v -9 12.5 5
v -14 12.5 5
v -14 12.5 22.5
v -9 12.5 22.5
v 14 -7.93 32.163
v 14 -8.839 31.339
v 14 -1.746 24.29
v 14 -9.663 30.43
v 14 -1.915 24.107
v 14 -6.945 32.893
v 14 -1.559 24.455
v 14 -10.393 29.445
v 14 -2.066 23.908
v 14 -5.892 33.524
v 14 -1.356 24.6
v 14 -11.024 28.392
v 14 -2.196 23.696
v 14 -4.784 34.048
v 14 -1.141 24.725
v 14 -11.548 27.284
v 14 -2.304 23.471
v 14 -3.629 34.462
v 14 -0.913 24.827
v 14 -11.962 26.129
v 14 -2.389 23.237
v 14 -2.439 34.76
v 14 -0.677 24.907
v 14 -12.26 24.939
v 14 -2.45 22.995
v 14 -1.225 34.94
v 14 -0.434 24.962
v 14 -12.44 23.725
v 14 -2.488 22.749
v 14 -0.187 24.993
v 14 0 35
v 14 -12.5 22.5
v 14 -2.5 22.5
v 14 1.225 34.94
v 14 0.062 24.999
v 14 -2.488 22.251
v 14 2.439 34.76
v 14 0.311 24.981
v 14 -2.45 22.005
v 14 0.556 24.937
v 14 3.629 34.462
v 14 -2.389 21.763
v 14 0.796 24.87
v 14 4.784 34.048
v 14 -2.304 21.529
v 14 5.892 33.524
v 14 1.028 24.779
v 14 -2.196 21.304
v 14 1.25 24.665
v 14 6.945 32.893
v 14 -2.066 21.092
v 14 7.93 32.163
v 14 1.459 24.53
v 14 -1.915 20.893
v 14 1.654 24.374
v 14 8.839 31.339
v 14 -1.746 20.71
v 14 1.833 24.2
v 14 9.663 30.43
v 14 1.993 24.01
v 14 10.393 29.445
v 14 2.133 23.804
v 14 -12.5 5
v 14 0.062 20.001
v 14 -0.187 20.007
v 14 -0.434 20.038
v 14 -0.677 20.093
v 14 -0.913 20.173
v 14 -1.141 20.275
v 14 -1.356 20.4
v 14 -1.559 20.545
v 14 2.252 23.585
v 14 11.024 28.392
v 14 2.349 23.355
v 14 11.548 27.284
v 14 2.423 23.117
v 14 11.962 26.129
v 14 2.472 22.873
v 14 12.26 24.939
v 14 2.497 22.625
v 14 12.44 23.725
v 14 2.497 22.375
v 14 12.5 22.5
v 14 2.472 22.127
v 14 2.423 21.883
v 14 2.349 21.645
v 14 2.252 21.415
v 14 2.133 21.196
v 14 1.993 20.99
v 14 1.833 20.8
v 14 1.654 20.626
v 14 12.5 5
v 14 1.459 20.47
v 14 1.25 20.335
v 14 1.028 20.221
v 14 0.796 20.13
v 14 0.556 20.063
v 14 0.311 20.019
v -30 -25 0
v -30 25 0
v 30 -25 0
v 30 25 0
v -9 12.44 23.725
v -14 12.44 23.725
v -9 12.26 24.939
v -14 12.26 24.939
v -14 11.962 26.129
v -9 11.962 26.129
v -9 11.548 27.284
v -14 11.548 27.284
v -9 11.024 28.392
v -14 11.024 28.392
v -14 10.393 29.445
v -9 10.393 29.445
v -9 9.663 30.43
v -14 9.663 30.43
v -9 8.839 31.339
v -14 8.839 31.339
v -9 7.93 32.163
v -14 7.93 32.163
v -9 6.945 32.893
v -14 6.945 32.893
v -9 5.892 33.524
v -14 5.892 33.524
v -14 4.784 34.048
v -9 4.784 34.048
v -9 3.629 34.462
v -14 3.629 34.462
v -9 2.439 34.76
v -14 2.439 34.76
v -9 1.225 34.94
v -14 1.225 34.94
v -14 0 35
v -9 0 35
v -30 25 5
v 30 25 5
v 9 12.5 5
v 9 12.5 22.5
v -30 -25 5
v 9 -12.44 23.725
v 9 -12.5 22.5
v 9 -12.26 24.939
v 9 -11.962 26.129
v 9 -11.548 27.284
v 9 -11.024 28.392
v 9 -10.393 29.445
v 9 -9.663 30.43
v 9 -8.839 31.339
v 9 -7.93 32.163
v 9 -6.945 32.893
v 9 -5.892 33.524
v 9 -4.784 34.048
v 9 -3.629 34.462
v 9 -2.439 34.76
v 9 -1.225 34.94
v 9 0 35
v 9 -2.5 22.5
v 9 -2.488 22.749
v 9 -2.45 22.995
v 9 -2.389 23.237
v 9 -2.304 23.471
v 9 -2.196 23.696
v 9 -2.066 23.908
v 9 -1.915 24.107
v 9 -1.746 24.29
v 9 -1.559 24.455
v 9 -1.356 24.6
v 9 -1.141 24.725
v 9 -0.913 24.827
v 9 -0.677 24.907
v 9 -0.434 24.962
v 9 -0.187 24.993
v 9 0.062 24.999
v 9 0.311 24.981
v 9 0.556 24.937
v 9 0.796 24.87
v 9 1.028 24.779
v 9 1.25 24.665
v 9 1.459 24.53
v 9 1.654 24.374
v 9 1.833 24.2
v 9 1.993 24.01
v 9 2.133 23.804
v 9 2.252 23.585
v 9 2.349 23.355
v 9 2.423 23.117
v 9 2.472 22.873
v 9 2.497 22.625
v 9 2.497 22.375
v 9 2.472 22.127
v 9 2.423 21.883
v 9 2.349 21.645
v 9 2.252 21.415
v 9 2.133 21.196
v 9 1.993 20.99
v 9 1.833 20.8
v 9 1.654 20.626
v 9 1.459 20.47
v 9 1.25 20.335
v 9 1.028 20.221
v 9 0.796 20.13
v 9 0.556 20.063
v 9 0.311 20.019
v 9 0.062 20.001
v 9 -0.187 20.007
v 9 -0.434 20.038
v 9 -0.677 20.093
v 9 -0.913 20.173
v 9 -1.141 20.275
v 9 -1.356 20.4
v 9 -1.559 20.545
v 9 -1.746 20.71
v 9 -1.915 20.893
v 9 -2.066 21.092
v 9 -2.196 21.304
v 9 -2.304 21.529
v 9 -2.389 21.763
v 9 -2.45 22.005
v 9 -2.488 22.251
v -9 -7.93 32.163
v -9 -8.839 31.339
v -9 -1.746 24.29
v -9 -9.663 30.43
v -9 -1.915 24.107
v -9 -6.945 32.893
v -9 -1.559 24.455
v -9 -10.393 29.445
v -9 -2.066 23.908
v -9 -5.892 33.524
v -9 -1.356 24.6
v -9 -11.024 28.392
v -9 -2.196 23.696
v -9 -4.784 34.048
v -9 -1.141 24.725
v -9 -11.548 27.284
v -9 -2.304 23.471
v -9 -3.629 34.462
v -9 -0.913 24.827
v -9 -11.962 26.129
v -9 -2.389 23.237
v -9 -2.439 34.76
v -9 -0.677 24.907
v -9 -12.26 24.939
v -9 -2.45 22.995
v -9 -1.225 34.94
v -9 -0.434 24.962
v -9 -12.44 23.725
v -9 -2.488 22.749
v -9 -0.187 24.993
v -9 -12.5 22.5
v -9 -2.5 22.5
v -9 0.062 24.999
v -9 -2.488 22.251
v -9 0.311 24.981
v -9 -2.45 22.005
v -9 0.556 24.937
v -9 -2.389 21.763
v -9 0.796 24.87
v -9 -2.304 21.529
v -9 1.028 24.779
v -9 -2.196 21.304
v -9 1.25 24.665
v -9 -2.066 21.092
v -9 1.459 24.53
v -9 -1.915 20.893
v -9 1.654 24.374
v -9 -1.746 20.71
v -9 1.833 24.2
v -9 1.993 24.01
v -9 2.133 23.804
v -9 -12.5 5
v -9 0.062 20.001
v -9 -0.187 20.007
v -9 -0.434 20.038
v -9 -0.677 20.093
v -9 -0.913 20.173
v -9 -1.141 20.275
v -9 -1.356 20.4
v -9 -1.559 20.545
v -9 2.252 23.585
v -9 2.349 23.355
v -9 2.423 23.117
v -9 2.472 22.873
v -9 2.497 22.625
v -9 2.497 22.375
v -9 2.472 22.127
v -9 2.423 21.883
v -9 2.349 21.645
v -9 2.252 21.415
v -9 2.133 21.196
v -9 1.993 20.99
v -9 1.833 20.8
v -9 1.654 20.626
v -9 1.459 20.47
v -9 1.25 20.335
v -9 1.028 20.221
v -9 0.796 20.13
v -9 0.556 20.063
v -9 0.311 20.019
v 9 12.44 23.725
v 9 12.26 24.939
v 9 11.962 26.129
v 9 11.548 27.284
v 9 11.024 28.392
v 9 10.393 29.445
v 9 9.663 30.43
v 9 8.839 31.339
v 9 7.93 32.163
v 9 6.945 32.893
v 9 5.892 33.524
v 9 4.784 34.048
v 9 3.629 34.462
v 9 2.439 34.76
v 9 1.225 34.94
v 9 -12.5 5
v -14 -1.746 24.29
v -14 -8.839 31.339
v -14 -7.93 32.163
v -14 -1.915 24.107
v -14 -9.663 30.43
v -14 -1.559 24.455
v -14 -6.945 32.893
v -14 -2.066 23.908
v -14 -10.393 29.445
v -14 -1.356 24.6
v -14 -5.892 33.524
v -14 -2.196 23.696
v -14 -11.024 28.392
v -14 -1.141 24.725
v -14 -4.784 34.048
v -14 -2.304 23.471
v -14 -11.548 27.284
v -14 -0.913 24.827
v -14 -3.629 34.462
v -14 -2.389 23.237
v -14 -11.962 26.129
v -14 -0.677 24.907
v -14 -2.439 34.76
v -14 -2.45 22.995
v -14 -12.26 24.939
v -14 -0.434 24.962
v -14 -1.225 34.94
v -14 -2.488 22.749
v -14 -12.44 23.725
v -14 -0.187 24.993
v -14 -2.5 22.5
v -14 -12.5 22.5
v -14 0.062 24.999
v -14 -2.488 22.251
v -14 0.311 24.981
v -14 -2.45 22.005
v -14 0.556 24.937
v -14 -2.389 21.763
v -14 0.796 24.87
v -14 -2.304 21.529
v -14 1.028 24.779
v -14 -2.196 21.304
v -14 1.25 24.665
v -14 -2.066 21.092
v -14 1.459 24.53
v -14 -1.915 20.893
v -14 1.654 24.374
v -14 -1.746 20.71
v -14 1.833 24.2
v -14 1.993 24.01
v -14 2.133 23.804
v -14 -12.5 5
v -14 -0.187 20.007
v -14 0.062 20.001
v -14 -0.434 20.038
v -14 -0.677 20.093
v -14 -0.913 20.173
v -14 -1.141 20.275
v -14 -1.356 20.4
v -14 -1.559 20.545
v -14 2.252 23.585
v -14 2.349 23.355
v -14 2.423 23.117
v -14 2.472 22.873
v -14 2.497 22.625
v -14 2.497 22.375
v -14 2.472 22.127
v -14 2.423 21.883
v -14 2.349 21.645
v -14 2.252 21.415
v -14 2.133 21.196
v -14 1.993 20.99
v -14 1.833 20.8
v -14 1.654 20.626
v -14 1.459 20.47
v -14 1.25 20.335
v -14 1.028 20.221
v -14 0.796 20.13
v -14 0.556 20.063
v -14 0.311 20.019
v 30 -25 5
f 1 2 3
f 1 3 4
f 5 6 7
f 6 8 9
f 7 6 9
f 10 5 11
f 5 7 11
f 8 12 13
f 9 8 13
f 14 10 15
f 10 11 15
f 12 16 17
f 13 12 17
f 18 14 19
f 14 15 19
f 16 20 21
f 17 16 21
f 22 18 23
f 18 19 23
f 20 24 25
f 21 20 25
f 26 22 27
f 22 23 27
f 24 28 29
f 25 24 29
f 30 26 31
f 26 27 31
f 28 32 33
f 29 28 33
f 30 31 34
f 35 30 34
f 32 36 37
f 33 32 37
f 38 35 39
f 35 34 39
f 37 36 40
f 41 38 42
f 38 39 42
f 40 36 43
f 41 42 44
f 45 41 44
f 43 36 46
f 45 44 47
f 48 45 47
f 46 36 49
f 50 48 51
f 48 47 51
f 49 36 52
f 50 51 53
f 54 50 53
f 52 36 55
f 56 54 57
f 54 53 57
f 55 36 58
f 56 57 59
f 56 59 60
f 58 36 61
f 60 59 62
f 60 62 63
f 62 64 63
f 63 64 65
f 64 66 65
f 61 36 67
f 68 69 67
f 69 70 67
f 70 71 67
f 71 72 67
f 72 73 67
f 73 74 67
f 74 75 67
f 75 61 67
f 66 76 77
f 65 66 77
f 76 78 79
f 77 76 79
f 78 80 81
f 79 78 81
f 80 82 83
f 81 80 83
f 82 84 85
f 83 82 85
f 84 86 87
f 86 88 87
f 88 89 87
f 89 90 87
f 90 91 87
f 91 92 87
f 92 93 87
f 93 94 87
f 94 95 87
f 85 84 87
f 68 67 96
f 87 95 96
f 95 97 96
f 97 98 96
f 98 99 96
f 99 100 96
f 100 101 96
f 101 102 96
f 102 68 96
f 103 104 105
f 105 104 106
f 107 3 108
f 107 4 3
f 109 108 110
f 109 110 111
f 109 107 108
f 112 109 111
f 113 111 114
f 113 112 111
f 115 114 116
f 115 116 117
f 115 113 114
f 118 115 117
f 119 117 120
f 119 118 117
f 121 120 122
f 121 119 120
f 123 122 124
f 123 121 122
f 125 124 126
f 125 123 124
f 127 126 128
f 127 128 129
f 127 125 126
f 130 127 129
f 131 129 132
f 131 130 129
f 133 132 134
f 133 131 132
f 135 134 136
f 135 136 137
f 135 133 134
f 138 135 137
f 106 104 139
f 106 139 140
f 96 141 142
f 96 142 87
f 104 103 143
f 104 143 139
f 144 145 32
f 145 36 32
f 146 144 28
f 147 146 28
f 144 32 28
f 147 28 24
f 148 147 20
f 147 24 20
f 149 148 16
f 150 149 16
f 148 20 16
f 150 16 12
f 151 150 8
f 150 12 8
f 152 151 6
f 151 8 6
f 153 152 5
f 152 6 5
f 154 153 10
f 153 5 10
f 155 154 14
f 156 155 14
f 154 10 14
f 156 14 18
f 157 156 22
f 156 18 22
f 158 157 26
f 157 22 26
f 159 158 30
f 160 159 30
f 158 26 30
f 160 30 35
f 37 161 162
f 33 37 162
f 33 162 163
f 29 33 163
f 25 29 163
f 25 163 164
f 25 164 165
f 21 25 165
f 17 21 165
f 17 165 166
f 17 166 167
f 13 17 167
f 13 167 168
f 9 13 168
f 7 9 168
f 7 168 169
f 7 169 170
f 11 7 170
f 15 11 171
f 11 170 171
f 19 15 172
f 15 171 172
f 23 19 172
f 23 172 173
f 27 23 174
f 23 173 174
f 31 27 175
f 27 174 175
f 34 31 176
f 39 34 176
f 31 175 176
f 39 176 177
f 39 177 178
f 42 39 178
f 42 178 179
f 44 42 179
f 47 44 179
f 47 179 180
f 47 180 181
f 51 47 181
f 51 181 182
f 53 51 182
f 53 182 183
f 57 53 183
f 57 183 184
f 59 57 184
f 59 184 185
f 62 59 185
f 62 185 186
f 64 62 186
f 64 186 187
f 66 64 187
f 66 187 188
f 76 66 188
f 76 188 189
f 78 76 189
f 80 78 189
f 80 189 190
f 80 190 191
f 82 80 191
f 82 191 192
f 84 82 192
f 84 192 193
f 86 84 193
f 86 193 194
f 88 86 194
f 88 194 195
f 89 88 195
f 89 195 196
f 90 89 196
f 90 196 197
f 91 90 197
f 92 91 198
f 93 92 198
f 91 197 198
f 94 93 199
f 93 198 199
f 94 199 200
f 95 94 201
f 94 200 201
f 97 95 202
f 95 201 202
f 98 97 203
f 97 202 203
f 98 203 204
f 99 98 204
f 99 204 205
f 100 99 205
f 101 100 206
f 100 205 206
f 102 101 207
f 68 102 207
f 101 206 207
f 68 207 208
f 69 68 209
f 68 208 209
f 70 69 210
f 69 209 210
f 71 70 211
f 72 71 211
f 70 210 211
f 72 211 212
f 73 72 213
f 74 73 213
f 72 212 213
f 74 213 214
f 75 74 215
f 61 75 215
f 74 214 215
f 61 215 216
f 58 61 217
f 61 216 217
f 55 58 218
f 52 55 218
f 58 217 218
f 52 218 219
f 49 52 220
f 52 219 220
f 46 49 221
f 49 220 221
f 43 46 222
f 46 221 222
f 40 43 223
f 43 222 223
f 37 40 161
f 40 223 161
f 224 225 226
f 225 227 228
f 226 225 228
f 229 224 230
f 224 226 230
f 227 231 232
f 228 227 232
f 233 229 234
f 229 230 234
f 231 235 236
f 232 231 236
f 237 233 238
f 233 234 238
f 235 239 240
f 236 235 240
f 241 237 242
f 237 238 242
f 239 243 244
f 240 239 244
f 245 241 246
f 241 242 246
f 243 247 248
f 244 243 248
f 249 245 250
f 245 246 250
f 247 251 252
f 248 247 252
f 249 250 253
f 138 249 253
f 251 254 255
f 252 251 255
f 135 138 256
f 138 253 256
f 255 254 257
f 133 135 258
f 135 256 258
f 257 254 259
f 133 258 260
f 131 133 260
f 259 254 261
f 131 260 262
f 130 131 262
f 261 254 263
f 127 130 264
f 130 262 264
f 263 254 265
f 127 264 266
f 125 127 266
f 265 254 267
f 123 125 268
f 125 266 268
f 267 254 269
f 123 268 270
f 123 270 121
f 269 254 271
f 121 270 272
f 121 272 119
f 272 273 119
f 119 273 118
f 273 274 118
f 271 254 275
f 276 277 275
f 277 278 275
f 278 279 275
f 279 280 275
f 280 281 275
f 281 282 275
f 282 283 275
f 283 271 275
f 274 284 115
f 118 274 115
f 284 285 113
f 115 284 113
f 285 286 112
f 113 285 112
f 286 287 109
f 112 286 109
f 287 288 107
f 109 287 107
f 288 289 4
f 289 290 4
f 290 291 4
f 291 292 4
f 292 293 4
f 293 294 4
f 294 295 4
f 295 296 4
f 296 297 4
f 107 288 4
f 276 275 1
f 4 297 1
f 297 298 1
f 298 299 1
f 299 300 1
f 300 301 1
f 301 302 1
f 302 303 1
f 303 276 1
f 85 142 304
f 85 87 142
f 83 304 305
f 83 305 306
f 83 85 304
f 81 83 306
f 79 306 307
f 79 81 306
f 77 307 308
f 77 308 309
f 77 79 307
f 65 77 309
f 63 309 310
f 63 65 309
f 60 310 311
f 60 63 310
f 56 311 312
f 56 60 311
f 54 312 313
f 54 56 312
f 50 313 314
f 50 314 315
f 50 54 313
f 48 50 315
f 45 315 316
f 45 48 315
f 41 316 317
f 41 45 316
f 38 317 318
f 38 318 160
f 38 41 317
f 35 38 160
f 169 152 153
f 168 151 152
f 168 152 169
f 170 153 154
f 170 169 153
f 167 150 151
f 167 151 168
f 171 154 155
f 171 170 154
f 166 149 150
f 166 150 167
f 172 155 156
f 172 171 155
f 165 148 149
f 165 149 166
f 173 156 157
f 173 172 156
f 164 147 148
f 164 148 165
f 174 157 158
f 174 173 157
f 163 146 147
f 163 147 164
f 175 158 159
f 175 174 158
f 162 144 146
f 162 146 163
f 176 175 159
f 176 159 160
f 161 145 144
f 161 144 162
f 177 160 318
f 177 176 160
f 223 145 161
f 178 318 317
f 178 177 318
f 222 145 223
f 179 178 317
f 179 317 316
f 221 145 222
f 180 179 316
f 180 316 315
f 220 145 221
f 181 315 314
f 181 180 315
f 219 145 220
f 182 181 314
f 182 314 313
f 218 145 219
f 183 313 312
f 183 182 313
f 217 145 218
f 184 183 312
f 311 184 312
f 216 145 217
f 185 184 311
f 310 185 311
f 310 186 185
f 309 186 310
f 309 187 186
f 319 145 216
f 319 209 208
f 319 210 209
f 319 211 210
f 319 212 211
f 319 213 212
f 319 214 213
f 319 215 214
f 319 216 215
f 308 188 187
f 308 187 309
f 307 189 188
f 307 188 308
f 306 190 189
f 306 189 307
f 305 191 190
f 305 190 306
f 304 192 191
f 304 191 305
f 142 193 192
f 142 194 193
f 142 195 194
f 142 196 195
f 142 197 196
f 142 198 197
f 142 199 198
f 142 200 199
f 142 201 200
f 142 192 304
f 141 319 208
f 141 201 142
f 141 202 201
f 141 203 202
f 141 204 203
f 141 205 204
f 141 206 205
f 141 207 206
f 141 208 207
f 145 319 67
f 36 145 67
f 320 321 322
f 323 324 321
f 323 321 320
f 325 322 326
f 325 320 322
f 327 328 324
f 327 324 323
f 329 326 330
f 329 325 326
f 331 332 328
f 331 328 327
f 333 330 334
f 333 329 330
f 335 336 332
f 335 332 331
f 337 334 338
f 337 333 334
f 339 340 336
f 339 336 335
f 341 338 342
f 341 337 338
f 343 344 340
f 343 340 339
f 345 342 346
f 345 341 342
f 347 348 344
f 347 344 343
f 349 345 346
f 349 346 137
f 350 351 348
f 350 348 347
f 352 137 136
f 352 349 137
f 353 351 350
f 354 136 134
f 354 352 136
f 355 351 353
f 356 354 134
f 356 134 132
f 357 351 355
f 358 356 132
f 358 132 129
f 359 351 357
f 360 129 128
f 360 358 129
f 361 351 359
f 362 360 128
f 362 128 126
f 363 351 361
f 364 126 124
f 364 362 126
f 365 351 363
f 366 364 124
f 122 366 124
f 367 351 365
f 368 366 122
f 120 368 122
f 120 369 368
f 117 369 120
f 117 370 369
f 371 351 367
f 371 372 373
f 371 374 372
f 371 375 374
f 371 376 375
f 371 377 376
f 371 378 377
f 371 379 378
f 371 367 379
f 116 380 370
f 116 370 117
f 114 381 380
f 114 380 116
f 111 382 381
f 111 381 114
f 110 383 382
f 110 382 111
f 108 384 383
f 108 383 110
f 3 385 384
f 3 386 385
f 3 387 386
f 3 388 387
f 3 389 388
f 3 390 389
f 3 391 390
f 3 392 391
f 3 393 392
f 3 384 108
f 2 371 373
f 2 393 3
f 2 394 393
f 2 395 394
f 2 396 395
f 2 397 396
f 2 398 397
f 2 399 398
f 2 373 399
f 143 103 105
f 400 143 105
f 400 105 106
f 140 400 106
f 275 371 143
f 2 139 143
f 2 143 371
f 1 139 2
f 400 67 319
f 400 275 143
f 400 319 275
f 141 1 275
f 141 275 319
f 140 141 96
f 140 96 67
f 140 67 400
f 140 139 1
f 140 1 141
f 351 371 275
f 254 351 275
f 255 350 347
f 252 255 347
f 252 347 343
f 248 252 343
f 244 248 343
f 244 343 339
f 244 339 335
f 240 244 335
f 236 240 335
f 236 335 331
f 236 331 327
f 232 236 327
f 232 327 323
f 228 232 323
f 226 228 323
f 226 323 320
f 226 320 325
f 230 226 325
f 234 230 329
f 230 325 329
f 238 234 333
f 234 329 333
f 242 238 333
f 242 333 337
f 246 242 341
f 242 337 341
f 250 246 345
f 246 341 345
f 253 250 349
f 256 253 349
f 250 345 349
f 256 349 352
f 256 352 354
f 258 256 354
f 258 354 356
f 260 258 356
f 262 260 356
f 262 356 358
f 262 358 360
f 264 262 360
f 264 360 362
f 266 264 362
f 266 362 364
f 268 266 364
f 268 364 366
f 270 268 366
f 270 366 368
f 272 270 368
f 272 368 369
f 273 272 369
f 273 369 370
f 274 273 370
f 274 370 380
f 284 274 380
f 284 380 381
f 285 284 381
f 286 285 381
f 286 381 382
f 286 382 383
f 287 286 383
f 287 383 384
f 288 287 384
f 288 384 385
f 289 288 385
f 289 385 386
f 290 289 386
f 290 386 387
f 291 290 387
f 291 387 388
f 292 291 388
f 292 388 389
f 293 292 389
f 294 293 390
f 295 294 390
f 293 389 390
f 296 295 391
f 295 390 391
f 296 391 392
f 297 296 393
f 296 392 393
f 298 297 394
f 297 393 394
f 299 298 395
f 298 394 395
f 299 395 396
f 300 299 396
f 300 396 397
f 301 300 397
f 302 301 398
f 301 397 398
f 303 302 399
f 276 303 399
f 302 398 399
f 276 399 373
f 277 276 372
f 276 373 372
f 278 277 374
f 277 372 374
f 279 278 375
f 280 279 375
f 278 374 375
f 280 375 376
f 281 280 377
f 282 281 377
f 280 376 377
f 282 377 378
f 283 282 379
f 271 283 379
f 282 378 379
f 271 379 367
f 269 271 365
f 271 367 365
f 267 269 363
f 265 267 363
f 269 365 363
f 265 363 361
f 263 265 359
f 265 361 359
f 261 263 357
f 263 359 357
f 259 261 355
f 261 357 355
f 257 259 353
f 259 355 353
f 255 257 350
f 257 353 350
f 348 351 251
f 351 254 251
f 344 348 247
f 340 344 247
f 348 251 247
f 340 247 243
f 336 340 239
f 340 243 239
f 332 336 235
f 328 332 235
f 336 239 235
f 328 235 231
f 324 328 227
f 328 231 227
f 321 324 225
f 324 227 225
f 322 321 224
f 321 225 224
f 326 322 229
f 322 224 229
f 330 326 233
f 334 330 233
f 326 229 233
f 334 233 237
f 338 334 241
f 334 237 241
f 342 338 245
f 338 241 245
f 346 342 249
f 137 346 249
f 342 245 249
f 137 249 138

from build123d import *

# Parameters (mm, degrees)
F0_W     = 60
F0_H     = 50
F1_DEPTH = 5
F2_W     = 5
F2_H     = 25
F3_DEPTH = 30
F4_R     = 12.49999
F5_R     = 2.5
F6_DEPTH = 50


# Not quite as in the source:
# - a fillet or chamfer is up to 0.001 mm smaller than in the source, because OpenCascade refuses the exact size


with BuildPart() as f1:
    # F0 (on Top) → F1 (new body)
    with BuildSketch(Plane.XY):
        Rectangle(F0_W, F0_H)
    extrude(amount=F1_DEPTH)

    # F2 (on face) → F3 (join)
    with BuildSketch(Plane.XY.offset(5)):
        with Locations((-11.5, 0)):
            Rectangle(F2_W, F2_H)
        with Locations((11.5, 0)):
            Rectangle(F2_W, F2_H)
    extrude(amount=F3_DEPTH)

    # F4 (radius 12.5 in the source; OpenCascade refuses exactly that, so slightly less here)
    f4_edges = [f1.edges().sort_by_distance(p)[0] for p in [
        (-11.5, -12.5, 35),
        (-11.5, 12.5, 35),
        (11.5, 12.5, 35),
        (11.5, -12.5, 35),
    ]]
    fillet(f4_edges, radius=F4_R)

    # F5 (on face) → F6 (cut)
    with BuildSketch(Plane(origin=(-14, 0, 0), x_dir=(0, -1, 0), z_dir=(-1, 0, 0))):
        with Locations((0, 22.5)):
            Circle(F5_R)
    extrude(amount=-F6_DEPTH, mode=Mode.SUBTRACT)


solid = f1.part
